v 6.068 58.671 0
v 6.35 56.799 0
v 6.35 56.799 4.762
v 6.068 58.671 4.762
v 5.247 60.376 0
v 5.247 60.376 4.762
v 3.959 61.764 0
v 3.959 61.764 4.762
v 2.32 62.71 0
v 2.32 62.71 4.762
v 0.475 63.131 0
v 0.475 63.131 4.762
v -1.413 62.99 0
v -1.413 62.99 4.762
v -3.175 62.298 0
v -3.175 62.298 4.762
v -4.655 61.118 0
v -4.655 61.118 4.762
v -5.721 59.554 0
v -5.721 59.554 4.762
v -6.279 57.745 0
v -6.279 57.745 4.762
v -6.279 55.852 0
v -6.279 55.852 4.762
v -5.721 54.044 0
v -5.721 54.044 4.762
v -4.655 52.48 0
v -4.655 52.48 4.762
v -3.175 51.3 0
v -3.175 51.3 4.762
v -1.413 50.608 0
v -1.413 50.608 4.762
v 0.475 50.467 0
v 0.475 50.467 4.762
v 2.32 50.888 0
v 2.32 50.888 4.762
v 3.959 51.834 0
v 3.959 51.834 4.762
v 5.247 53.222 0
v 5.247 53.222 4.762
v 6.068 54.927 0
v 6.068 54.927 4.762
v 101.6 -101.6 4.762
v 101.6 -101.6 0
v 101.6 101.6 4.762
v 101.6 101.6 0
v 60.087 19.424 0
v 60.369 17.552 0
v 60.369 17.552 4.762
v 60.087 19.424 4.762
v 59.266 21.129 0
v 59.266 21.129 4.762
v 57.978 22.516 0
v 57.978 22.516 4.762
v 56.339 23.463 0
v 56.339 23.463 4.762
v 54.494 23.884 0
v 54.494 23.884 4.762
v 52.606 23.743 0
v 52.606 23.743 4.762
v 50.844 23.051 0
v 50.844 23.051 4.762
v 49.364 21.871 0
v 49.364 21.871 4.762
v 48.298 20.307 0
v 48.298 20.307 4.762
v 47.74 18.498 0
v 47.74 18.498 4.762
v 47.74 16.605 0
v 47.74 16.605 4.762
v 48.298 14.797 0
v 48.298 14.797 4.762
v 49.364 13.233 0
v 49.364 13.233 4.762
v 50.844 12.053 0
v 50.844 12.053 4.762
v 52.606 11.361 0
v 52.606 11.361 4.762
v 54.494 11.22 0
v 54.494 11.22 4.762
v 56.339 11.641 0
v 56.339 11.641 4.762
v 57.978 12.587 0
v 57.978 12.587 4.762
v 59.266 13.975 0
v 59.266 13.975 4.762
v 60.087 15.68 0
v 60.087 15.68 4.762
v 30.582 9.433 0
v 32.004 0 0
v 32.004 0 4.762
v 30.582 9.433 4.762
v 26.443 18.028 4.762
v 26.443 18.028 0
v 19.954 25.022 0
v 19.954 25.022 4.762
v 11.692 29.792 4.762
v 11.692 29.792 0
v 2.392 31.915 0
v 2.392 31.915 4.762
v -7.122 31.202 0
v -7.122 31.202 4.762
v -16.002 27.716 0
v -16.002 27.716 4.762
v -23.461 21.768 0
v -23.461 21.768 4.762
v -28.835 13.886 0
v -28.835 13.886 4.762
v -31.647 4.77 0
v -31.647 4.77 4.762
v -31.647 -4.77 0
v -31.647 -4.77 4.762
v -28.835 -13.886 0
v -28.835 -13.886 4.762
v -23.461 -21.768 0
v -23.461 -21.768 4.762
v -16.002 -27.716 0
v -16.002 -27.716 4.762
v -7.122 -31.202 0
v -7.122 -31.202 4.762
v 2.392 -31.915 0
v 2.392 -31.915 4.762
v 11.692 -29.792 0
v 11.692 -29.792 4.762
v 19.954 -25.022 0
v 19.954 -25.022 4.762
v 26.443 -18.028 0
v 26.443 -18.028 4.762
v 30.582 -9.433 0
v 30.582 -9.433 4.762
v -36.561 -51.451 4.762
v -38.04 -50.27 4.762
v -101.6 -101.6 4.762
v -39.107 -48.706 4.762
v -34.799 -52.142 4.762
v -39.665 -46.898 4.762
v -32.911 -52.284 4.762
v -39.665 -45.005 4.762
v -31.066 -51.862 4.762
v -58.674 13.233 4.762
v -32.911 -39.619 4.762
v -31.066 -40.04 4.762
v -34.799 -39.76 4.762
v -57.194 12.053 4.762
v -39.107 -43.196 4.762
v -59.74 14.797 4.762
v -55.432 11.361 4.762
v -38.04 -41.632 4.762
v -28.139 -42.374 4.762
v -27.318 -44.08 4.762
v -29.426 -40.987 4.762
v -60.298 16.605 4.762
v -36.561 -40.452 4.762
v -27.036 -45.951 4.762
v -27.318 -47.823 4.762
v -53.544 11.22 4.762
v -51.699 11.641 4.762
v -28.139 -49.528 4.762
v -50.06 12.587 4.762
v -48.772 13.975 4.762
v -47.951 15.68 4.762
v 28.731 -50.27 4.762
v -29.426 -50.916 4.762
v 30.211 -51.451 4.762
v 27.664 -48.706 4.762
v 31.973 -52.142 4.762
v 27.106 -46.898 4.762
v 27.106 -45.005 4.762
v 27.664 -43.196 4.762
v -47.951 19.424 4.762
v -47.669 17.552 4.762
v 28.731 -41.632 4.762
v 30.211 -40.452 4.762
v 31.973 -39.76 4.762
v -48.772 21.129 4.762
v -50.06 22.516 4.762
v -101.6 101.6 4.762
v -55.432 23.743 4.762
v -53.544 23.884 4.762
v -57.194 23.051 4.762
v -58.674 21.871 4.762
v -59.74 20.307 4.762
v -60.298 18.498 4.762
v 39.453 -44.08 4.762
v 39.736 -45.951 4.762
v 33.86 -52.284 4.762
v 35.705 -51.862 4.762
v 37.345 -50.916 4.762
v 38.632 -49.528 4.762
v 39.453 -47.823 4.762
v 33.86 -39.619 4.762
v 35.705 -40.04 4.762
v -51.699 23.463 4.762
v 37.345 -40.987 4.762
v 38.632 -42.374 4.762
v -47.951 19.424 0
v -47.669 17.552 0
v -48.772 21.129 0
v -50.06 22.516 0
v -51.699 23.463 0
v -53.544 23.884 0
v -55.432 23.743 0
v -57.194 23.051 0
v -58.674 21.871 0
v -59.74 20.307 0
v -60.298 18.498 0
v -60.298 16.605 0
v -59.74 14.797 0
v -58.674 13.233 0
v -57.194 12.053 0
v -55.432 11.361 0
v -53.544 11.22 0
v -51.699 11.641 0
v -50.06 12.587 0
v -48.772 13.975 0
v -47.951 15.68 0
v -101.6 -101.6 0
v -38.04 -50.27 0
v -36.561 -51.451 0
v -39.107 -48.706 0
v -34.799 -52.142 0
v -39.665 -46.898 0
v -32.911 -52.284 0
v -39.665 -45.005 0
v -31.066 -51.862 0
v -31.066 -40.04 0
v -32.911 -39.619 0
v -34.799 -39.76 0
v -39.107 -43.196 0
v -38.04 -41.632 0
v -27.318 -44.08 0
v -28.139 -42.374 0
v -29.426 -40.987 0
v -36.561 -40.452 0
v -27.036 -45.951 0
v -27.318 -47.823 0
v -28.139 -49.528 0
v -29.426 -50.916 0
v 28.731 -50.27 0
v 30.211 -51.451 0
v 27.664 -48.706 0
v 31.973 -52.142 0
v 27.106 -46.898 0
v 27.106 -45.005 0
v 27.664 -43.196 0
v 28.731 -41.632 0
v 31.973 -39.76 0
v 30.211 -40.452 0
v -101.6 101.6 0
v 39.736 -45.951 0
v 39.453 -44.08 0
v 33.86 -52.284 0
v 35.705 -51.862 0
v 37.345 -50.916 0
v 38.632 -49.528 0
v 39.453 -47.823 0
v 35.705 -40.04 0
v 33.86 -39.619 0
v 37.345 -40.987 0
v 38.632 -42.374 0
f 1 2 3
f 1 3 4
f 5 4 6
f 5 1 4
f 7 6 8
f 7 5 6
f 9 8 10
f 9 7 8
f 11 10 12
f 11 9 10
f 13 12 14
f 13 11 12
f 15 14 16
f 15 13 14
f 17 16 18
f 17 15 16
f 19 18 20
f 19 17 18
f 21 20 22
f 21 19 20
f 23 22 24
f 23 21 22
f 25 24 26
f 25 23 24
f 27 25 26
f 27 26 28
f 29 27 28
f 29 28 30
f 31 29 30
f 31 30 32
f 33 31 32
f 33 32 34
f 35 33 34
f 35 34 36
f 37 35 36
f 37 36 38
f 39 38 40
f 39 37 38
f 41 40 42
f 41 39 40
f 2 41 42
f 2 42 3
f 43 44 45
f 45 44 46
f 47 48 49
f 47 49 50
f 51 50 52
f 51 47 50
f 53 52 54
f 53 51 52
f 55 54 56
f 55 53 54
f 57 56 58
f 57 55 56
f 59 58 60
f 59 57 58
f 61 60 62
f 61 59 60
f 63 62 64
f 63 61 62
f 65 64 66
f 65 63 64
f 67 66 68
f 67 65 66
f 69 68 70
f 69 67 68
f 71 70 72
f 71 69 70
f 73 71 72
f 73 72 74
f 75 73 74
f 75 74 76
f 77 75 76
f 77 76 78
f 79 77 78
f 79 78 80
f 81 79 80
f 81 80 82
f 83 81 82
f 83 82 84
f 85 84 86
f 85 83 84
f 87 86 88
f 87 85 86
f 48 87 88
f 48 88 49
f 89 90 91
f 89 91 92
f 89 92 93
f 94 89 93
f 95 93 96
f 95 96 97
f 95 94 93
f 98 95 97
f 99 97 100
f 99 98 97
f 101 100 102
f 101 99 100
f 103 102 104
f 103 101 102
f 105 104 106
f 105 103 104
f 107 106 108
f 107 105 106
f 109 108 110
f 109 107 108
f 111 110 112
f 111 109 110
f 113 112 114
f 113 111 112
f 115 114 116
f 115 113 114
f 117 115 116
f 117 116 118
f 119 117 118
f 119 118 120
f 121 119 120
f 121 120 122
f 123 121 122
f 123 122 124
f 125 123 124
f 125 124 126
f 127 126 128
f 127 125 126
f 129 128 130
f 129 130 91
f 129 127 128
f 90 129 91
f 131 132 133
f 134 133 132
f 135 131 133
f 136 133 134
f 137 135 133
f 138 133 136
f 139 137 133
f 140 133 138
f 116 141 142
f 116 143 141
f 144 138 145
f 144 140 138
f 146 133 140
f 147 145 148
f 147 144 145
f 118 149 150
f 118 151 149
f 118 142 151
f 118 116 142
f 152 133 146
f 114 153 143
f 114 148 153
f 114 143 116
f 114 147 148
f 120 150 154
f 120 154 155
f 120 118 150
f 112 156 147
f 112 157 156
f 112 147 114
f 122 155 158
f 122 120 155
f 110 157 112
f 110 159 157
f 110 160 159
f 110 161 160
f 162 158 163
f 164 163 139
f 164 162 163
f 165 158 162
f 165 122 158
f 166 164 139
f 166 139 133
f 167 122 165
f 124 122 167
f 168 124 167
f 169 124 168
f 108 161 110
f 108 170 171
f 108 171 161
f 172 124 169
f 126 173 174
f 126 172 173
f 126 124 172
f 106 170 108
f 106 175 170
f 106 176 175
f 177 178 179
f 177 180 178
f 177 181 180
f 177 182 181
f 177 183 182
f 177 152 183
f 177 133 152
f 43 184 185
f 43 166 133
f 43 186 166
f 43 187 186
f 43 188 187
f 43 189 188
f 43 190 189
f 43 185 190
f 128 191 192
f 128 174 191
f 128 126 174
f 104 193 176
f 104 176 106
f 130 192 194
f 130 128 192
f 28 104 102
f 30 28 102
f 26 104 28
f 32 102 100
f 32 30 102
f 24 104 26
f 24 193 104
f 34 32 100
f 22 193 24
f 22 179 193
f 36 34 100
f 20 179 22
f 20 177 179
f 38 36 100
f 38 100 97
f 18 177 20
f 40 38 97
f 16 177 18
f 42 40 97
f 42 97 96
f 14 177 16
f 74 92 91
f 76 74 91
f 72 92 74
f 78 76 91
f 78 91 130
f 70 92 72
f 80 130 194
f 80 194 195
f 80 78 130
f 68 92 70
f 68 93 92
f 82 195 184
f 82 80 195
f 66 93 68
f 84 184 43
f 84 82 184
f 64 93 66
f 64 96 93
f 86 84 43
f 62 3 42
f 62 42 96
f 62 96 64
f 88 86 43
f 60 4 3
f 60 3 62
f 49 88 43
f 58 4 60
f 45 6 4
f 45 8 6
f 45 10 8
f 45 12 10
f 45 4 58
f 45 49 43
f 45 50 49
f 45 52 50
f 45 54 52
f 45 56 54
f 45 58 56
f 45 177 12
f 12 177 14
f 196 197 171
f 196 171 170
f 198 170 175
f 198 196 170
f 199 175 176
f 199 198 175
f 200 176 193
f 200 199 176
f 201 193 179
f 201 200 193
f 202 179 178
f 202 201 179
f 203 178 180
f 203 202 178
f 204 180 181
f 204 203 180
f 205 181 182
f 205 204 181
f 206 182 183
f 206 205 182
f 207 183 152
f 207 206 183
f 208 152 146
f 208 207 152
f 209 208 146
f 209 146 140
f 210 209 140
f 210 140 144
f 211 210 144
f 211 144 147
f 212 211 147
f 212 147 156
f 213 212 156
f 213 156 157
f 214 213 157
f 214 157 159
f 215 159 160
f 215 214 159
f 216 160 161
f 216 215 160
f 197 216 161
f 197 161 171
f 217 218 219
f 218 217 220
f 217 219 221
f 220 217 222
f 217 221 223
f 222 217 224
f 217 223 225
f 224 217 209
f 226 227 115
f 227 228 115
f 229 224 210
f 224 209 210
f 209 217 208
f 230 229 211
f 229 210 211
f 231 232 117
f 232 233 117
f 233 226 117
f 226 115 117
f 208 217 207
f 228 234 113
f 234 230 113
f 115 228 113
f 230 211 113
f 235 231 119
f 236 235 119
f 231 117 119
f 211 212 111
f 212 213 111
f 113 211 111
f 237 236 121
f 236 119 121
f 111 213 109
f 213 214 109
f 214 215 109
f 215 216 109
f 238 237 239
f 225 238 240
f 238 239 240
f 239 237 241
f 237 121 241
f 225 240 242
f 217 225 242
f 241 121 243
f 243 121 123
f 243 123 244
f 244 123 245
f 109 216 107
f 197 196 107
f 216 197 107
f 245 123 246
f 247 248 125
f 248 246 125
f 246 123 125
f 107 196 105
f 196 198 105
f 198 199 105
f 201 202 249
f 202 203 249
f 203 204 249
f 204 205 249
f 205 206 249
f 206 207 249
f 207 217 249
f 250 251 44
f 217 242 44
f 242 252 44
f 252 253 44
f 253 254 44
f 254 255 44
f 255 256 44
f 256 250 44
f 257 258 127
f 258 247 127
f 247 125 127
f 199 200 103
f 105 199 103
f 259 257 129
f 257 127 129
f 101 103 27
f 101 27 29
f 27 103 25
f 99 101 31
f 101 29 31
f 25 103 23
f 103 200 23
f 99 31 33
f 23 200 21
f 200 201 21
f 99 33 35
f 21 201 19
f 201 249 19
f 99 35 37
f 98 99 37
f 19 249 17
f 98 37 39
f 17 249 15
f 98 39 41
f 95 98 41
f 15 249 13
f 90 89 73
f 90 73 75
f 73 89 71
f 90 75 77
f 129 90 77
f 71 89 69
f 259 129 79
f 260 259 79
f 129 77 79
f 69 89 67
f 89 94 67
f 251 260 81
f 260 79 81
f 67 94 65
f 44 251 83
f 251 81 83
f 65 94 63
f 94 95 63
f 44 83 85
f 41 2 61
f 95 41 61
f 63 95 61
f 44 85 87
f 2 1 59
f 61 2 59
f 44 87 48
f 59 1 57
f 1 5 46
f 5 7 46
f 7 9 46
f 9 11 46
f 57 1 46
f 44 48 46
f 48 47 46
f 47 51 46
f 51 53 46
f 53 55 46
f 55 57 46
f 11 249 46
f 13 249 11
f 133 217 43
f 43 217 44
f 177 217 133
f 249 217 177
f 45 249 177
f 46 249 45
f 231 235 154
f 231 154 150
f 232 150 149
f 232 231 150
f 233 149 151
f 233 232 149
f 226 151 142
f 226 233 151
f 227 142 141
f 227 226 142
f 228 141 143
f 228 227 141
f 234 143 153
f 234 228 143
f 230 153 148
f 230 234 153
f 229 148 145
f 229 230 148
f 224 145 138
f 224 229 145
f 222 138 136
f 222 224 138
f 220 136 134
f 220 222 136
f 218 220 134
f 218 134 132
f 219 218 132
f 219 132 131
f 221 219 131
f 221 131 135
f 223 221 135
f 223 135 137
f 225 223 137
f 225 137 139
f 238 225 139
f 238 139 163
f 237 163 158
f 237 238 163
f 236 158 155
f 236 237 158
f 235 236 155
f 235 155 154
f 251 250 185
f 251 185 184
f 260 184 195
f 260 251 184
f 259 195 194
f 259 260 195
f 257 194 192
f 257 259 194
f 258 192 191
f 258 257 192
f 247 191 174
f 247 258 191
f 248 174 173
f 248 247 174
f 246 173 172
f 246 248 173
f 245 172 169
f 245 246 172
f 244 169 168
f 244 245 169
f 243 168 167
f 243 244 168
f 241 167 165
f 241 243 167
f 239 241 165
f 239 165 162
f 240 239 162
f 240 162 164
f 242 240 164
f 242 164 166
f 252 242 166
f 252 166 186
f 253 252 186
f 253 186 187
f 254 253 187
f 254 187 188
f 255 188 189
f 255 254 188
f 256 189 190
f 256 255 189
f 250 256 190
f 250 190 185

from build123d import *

# Parameters (mm, degrees)
SKETCH4_W           = 203.2
SKETCH4_H           = 203.2
SKETCH4_R           = 6.35
SKETCH4_R_2         = 32.004
BOSS_EXTRUDE1_DEPTH = 4.7625


with BuildPart() as part:
    # Sketch4 → Boss-Extrude1 (new body)
    with BuildSketch(Plane.XY):
        Rectangle(SKETCH4_W, SKETCH4_H)
        with Locations((-54.018973032, 17.551828308)):
            Circle(SKETCH4_R, mode=Mode.SUBTRACT)
        with Locations((0, 56.798909535)):
            Circle(SKETCH4_R, mode=Mode.SUBTRACT)
        with Locations((-33.385561371, -45.951283076)):
            Circle(SKETCH4_R, mode=Mode.SUBTRACT)
        with Locations((33.385561371, -45.951283076)):
            Circle(SKETCH4_R, mode=Mode.SUBTRACT)
        with Locations((54.018973032, 17.551828308)):
            Circle(SKETCH4_R, mode=Mode.SUBTRACT)
        Circle(SKETCH4_R_2, mode=Mode.SUBTRACT)
    extrude(amount=BOSS_EXTRUDE1_DEPTH)


solid = part.part
